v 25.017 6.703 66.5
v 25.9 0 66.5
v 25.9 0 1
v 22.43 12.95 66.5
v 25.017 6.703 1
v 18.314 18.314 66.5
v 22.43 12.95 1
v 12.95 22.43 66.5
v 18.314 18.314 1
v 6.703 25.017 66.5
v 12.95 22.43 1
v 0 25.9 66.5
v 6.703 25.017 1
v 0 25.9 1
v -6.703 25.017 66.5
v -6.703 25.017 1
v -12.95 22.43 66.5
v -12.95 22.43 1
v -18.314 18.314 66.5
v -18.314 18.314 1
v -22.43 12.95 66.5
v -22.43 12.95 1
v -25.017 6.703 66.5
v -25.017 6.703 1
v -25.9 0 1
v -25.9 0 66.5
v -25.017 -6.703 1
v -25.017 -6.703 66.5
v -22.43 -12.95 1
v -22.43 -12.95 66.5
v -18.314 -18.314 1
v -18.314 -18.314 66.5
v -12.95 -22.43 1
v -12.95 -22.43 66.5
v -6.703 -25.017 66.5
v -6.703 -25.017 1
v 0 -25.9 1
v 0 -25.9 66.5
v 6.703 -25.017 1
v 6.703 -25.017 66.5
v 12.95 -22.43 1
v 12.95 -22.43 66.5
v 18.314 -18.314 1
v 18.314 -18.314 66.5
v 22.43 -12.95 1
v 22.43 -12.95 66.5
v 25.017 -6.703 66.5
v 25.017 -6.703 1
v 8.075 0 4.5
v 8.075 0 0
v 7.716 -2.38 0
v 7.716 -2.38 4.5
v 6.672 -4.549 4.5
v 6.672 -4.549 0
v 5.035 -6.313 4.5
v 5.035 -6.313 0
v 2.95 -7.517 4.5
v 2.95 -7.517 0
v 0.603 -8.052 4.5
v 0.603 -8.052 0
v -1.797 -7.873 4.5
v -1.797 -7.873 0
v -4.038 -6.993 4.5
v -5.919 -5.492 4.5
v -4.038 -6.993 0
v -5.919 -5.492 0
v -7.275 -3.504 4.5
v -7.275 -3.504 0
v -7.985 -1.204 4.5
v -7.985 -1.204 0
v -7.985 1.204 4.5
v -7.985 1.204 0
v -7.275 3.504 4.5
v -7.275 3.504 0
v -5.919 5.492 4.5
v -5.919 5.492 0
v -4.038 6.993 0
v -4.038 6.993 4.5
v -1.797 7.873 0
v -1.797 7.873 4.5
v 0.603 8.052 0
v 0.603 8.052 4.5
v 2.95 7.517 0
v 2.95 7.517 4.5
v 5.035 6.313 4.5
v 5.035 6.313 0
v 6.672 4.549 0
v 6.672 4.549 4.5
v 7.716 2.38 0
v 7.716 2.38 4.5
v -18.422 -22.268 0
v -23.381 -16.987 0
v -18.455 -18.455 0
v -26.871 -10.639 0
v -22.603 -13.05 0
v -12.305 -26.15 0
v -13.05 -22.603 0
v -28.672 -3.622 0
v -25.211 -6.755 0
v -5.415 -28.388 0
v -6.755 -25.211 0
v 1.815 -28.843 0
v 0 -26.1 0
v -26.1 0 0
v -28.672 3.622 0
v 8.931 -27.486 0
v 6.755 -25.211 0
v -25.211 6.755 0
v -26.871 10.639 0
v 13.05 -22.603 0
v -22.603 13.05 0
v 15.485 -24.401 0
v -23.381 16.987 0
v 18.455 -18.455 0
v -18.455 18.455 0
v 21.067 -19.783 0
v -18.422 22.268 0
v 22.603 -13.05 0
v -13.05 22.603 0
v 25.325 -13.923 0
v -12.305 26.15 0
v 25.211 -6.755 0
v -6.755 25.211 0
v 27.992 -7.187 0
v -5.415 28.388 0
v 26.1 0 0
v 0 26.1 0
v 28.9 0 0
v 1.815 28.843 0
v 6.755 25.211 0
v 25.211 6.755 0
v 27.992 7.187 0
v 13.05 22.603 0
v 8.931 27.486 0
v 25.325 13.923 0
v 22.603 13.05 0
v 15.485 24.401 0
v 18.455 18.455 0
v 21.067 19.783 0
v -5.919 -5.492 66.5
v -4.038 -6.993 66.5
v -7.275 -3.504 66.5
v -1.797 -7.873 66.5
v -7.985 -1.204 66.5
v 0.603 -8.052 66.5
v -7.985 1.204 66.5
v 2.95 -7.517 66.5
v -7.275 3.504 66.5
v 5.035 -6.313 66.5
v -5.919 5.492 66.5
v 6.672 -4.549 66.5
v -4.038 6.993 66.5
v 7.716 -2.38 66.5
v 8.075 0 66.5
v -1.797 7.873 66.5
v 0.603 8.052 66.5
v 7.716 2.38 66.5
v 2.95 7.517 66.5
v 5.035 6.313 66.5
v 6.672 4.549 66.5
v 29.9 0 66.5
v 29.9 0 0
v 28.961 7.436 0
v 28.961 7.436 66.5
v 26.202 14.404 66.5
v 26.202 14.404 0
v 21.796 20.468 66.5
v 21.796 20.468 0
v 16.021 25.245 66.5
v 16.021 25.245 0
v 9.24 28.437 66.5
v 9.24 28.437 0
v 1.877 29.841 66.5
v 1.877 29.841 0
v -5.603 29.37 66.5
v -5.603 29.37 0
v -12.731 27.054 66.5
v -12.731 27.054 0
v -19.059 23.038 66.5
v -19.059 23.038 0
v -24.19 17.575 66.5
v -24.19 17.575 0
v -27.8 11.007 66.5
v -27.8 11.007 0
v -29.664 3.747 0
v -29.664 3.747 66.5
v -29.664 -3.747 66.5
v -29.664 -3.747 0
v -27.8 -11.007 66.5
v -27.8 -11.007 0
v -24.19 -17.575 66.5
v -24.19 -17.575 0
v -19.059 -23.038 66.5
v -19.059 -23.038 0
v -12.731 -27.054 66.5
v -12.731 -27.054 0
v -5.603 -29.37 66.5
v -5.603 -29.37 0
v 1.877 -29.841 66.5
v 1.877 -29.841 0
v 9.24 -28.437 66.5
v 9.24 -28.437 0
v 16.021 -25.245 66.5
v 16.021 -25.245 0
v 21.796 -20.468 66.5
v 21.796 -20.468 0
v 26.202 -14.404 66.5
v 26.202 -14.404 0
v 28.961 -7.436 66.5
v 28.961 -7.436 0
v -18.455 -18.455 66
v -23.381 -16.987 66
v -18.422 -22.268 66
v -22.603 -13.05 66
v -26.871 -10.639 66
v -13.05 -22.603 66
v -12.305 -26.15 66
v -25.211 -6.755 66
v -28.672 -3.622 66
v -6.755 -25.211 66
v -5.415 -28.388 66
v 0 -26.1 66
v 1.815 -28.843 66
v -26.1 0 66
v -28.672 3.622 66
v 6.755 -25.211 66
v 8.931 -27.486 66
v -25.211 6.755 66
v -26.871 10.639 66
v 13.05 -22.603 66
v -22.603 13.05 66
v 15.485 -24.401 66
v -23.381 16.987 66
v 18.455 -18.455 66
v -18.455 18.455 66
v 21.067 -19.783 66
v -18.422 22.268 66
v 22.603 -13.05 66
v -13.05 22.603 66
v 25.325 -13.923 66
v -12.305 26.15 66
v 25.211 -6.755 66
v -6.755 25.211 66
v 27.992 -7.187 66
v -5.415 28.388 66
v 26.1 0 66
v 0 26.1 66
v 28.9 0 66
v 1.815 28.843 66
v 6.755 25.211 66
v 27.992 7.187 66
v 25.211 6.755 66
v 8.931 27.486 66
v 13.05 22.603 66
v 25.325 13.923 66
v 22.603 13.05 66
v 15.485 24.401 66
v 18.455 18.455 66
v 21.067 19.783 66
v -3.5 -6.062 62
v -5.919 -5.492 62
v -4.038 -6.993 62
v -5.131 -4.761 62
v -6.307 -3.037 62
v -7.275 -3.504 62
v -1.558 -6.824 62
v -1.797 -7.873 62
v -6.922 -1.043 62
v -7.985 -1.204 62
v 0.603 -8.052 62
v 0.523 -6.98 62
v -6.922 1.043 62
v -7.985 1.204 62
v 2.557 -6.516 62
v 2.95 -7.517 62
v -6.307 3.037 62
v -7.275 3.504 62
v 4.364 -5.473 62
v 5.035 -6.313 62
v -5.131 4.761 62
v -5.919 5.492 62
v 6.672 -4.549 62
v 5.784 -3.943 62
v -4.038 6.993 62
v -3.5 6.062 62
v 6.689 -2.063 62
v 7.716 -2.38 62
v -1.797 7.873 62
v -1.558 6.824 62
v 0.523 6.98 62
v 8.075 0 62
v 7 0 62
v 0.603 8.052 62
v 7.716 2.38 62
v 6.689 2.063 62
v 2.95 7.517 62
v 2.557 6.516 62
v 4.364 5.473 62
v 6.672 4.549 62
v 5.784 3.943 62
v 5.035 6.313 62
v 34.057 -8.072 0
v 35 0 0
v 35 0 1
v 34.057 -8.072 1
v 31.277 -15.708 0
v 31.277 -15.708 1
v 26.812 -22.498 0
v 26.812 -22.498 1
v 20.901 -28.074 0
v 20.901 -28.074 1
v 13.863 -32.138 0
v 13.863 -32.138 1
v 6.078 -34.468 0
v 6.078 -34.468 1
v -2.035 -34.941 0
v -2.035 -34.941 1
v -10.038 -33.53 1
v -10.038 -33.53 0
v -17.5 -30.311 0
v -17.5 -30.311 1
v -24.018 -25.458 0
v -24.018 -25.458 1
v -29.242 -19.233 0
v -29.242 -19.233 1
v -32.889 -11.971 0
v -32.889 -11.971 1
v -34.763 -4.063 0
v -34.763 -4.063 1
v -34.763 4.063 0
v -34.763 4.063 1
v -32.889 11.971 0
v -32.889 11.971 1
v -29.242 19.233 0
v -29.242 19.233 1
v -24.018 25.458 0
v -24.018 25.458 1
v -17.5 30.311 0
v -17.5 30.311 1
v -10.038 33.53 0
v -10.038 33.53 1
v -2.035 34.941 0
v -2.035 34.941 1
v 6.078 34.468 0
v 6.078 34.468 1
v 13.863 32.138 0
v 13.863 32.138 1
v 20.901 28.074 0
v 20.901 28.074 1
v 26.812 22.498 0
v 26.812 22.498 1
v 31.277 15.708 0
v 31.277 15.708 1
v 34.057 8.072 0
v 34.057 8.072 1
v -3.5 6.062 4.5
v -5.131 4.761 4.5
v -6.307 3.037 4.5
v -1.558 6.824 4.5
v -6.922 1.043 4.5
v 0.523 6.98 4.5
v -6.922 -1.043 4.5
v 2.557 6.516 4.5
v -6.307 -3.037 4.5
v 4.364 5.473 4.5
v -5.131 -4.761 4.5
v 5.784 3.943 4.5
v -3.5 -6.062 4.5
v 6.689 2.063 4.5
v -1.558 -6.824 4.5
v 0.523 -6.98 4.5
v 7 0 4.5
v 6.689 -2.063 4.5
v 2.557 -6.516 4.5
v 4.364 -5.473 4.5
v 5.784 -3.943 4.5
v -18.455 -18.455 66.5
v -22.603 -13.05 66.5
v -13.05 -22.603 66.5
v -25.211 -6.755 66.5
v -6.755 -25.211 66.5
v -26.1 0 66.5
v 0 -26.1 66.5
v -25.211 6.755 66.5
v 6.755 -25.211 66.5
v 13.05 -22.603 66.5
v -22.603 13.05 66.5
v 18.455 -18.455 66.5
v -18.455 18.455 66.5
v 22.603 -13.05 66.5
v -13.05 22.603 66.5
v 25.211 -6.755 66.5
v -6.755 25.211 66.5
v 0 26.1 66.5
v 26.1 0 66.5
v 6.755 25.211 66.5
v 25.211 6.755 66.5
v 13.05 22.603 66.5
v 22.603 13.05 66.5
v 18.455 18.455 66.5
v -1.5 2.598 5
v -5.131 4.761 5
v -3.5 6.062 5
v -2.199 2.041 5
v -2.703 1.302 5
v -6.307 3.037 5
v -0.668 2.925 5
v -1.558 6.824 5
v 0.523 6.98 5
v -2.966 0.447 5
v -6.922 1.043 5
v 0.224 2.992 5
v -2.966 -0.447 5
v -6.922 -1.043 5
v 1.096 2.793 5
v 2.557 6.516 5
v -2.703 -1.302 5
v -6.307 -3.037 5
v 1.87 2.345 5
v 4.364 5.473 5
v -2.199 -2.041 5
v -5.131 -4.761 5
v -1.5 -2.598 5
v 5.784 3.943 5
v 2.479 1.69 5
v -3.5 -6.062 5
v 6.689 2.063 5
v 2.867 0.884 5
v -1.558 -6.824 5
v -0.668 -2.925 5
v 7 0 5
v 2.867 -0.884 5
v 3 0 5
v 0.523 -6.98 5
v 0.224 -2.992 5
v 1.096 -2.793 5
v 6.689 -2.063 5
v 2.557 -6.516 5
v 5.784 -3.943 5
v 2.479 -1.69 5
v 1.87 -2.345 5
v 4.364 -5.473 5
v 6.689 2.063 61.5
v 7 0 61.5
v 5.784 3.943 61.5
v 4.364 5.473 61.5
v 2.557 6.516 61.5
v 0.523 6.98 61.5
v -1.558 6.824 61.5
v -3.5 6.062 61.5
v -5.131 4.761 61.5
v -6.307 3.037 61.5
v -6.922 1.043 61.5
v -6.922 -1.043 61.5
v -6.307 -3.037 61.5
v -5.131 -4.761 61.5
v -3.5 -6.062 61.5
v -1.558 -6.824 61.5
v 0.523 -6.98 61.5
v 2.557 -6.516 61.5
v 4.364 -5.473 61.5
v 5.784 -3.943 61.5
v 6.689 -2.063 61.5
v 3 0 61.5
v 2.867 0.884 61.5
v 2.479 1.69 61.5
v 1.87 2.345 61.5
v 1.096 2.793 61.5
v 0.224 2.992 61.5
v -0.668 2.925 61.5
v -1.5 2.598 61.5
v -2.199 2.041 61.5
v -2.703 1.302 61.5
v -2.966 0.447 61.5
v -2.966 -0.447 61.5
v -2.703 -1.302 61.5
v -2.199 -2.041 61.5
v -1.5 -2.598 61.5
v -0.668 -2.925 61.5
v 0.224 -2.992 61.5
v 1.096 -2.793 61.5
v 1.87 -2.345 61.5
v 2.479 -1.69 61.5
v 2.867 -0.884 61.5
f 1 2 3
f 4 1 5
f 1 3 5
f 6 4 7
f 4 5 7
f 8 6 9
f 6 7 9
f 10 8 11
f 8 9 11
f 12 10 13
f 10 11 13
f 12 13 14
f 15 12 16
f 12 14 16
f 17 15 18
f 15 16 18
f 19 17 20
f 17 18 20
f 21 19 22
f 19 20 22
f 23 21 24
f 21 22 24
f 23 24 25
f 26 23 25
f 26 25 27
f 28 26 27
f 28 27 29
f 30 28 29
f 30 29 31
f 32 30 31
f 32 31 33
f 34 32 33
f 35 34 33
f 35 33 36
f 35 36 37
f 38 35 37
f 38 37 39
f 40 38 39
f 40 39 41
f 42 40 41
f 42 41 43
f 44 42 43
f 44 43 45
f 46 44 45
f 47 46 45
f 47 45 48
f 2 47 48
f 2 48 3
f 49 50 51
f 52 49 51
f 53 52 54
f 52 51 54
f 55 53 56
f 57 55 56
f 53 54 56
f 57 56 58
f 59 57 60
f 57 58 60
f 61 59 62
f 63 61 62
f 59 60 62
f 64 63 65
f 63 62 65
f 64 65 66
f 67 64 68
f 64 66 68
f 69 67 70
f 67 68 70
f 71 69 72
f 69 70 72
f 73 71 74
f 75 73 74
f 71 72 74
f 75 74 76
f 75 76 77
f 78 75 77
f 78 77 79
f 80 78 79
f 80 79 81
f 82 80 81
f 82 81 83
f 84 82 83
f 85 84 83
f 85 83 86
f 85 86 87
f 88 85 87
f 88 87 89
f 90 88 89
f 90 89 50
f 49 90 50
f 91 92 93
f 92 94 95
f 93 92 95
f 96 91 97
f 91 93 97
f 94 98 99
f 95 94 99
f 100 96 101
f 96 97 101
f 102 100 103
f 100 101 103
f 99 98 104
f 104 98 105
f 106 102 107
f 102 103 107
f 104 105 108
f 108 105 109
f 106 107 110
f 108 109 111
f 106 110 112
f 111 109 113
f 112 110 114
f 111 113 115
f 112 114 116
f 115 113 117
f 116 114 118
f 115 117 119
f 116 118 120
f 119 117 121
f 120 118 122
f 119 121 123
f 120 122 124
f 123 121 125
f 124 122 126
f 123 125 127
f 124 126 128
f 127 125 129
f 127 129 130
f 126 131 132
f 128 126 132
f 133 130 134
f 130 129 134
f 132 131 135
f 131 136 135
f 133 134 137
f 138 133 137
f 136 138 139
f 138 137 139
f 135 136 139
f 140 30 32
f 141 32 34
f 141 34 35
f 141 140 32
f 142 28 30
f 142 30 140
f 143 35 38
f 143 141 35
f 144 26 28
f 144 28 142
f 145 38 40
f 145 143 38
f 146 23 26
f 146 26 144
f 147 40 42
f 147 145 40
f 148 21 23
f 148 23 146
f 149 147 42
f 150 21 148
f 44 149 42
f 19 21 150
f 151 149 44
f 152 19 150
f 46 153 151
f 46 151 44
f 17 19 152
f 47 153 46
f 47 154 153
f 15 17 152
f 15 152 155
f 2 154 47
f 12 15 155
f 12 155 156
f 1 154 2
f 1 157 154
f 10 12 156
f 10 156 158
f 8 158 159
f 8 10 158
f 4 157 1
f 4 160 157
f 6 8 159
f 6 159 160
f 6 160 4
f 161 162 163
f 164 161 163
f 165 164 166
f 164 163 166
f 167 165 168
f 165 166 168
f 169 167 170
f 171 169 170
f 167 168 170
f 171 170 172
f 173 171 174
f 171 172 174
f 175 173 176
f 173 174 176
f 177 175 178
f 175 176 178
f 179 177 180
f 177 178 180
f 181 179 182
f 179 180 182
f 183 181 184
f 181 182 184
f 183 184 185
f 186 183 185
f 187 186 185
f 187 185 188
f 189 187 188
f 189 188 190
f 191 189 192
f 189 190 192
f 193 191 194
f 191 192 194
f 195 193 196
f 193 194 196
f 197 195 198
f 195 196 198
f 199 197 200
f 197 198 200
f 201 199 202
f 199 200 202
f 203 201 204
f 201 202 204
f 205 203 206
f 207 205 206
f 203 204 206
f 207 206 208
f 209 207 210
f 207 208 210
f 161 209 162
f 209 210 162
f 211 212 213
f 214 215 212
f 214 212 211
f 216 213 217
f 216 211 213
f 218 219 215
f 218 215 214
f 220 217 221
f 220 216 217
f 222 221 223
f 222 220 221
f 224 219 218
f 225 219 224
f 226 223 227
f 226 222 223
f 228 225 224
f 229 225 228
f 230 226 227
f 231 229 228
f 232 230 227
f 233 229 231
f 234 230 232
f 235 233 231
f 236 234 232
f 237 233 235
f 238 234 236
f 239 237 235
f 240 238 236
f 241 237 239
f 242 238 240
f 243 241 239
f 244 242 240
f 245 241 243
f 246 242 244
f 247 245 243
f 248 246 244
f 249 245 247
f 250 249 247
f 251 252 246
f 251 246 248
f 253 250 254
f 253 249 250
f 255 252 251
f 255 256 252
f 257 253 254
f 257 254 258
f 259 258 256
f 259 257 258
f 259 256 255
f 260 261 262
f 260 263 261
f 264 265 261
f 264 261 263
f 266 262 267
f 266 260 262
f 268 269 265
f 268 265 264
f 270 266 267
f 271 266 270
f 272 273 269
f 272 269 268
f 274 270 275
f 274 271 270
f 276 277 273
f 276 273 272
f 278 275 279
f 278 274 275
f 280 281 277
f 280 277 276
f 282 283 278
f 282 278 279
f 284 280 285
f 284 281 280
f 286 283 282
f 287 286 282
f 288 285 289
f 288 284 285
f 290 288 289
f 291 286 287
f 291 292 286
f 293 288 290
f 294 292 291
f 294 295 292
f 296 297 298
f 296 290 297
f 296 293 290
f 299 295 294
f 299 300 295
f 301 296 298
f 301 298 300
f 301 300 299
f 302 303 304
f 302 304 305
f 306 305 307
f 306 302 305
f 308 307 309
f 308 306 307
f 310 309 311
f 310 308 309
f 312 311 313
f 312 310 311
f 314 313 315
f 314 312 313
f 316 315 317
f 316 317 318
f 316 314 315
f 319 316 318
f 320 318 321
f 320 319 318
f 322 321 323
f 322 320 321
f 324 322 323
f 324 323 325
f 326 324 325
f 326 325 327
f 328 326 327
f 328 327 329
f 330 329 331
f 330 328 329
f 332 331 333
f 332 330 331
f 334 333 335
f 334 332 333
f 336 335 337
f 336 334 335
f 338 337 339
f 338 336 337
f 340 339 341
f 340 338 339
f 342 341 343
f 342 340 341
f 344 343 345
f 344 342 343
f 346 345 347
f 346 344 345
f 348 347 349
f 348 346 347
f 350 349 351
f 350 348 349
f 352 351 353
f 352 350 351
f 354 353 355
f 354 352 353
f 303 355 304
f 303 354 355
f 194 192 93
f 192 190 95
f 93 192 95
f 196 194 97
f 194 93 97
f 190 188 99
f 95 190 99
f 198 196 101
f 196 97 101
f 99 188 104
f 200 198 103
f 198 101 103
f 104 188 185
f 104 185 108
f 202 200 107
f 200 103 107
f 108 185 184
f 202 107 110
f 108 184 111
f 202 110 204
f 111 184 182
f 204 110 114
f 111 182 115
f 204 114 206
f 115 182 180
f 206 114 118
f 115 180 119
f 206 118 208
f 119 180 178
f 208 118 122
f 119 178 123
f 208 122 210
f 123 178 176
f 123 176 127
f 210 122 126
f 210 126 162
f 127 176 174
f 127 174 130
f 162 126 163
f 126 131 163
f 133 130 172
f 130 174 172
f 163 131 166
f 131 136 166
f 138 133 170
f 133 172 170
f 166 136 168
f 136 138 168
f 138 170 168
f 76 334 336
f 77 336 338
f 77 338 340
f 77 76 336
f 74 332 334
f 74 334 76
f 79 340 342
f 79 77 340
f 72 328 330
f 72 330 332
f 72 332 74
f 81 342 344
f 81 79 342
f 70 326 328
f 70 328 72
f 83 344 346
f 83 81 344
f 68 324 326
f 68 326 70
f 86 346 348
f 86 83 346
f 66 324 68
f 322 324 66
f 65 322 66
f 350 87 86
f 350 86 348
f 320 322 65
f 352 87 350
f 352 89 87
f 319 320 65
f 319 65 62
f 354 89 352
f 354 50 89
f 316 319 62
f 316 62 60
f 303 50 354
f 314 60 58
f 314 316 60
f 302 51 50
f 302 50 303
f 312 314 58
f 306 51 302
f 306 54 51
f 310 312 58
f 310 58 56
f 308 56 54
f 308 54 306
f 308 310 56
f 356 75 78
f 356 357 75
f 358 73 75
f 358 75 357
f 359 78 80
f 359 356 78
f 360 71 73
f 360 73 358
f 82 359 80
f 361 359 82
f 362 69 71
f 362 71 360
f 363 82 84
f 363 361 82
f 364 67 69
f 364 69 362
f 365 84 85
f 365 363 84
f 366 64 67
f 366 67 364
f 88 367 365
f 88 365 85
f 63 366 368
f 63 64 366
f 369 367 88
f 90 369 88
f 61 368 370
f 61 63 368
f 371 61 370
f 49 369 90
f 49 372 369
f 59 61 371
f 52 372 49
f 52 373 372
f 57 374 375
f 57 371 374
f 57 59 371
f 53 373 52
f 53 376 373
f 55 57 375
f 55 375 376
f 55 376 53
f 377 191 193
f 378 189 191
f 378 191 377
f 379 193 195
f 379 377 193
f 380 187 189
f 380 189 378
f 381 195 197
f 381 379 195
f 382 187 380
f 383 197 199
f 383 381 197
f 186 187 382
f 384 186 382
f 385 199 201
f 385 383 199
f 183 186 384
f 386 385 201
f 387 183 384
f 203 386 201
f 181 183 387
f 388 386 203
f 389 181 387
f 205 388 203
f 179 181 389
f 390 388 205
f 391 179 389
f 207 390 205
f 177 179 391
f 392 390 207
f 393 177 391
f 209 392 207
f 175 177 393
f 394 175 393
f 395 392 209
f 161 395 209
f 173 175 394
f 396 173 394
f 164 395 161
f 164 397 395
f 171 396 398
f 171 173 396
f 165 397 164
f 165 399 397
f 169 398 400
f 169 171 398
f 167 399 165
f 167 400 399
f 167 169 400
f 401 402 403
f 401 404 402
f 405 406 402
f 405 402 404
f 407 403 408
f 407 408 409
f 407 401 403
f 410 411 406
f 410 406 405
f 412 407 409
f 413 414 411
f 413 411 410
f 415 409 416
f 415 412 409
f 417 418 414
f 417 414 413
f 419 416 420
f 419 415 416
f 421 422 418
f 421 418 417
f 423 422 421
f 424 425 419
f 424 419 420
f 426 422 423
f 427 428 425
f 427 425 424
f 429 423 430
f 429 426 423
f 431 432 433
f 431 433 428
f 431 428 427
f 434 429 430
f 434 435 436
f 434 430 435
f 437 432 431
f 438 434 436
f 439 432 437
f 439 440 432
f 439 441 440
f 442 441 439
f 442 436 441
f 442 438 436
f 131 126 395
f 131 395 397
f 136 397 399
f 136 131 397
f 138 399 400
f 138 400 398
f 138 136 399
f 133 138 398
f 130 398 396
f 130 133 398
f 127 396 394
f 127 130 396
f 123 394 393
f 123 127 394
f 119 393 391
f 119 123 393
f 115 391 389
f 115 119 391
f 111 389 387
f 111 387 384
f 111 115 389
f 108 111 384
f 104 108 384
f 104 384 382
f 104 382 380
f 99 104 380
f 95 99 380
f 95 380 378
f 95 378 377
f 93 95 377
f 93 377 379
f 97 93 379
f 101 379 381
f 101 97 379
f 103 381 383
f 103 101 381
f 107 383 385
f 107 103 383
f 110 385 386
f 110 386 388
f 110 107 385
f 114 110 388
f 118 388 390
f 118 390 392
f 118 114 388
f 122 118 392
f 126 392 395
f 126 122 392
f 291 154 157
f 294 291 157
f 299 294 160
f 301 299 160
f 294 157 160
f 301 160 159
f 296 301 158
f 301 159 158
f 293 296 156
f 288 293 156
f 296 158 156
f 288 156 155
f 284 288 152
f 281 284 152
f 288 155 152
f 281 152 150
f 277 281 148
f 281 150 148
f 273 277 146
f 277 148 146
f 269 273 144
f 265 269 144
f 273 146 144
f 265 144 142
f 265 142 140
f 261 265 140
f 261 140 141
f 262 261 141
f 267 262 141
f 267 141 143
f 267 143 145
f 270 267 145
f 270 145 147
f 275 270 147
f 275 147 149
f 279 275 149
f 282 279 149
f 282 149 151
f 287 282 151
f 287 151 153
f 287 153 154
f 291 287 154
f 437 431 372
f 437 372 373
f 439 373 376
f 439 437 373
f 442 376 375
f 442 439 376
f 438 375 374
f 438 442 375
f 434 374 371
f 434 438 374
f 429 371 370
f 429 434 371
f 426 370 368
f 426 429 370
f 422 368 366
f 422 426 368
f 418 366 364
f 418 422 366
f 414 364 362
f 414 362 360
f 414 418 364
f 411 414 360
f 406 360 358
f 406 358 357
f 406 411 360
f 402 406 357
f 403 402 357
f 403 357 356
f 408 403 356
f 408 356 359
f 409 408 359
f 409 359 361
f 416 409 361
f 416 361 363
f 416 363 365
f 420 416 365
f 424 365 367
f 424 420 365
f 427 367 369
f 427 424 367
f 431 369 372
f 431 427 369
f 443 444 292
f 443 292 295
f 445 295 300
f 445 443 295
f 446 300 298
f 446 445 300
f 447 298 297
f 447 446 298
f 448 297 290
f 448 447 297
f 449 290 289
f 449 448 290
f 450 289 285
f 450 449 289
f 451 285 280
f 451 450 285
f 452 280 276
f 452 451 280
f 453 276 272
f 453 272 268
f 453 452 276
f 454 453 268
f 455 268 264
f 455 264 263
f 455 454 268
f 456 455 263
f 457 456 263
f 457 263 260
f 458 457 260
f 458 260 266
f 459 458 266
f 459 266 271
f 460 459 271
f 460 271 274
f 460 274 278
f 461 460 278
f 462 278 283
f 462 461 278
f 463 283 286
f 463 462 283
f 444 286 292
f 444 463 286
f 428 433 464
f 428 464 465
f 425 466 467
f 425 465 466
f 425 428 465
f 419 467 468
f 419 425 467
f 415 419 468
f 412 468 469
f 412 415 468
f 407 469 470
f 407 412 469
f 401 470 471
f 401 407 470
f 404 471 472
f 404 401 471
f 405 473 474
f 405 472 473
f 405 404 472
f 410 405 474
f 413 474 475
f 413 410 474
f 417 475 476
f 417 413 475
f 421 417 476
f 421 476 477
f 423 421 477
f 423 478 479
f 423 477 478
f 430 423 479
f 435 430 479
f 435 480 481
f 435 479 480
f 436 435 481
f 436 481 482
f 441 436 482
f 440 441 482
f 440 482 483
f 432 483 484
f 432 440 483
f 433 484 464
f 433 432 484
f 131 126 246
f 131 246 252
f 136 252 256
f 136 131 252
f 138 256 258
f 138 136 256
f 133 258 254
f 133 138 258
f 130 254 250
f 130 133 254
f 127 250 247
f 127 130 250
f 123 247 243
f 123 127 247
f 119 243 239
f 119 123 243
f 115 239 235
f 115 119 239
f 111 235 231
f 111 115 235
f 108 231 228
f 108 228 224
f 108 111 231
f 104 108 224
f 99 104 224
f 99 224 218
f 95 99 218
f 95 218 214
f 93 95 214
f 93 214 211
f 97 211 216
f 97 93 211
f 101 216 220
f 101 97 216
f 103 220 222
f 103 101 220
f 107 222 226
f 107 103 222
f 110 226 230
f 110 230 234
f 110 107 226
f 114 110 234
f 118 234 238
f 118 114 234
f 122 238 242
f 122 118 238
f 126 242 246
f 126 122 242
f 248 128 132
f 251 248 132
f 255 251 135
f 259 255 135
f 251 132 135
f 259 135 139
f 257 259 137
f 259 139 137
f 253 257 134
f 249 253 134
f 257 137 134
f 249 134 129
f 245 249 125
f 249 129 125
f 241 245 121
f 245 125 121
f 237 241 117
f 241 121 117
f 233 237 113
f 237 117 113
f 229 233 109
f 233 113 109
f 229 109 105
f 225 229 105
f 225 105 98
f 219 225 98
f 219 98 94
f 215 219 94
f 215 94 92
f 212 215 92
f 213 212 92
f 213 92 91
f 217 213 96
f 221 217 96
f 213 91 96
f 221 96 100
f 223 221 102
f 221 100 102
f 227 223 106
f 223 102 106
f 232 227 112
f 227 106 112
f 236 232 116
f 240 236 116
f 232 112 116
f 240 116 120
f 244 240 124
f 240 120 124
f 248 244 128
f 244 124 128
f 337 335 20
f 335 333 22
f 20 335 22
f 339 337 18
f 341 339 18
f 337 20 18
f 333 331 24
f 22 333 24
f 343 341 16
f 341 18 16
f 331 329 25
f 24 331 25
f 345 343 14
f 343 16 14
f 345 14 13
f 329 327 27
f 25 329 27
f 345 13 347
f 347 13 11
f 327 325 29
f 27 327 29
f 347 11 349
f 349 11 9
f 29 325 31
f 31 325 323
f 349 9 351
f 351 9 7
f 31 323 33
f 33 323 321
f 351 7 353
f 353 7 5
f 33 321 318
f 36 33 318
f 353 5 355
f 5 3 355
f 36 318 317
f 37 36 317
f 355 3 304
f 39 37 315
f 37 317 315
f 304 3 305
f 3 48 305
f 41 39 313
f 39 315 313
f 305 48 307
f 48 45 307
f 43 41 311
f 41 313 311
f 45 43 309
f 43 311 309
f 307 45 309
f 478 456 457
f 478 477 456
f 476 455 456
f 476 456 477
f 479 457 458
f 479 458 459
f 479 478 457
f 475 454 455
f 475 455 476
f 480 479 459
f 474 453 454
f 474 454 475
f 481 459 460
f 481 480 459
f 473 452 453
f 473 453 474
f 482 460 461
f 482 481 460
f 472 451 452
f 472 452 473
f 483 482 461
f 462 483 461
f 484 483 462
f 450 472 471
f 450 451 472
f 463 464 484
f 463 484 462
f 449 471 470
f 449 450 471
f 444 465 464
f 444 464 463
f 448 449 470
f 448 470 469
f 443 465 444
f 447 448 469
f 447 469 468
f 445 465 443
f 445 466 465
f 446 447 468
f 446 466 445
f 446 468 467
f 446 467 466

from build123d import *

# Parameters (mm, degrees)
F0_R      = 25.9
F0_R_2    = 3
F1_DEPTH  = 66.5
F2_R      = 35
F2_R_2    = 3
F3_DEPTH  = 1
F4_R      = 8.075
F5_DEPTH  = 5
F6_R      = 8.075
F7_DEPTH  = 5
F8_R      = 8.075
F8_R_2    = 7
F9_DEPTH  = 0.5
F10_R     = 8.075
F10_R_2   = 7
F11_DEPTH = 0.5
F12_R     = 29.9
F12_R_2   = 26.1
F13_DEPTH = 66.5
F14_R     = 28.9
F14_R_2   = 26.1
F15_DEPTH = 66


with BuildPart() as f1:
    # F0 (on Top) → F1 (new body)
    with BuildSketch(Plane.XY):
        Circle(F0_R)
        Circle(F0_R_2, mode=Mode.SUBTRACT)
    extrude(amount=F1_DEPTH)

    # F2 (on face) → F3 (join)
    with BuildSketch(Plane(origin=(0, 0, 0), x_dir=(1, 0, 0), z_dir=(0, 0, -1))):
        Circle(F2_R)
        Circle(F2_R_2, mode=Mode.SUBTRACT)
    extrude(amount=-F3_DEPTH)

    # F4 (on face) → F5 (cut)
    with BuildSketch(Plane(origin=(0, 0, 0), x_dir=(1, 0, 0), z_dir=(0, 0, -1))):
        Circle(F4_R)
    extrude(amount=-F5_DEPTH, mode=Mode.SUBTRACT)

    # F6 (on face) → F7 (cut)
    with BuildSketch(Plane.XY.offset(66.5)):
        Circle(F6_R)
    extrude(amount=-F7_DEPTH, mode=Mode.SUBTRACT)

    # F8 (on face) → F9 (join)
    with BuildSketch(Plane.XY.offset(61.5)):
        Circle(F8_R)
        Circle(F8_R_2, mode=Mode.SUBTRACT)
    extrude(amount=F9_DEPTH)

    # F10 (on face) → F11 (join)
    with BuildSketch(Plane(origin=(0, 0, 5), x_dir=(1, 0, 0), z_dir=(0, 0, -1))):
        Circle(F10_R)
        Circle(F10_R_2, mode=Mode.SUBTRACT)
    extrude(amount=F11_DEPTH)


with BuildPart() as f13:
    # F12 (on Top) → F13 (new body)
    with BuildSketch(Plane.XY):
        Circle(F12_R)
        Circle(F12_R_2, mode=Mode.SUBTRACT)
    extrude(amount=F13_DEPTH)


with BuildPart() as f15:
    # F14 (on Top) → F15 (new body)
    with BuildSketch(Plane.XY):
        Circle(F14_R)
        Circle(F14_R_2, mode=Mode.SUBTRACT)
    extrude(amount=F15_DEPTH)


solid = Compound([f1.part, f13.part, f15.part])
